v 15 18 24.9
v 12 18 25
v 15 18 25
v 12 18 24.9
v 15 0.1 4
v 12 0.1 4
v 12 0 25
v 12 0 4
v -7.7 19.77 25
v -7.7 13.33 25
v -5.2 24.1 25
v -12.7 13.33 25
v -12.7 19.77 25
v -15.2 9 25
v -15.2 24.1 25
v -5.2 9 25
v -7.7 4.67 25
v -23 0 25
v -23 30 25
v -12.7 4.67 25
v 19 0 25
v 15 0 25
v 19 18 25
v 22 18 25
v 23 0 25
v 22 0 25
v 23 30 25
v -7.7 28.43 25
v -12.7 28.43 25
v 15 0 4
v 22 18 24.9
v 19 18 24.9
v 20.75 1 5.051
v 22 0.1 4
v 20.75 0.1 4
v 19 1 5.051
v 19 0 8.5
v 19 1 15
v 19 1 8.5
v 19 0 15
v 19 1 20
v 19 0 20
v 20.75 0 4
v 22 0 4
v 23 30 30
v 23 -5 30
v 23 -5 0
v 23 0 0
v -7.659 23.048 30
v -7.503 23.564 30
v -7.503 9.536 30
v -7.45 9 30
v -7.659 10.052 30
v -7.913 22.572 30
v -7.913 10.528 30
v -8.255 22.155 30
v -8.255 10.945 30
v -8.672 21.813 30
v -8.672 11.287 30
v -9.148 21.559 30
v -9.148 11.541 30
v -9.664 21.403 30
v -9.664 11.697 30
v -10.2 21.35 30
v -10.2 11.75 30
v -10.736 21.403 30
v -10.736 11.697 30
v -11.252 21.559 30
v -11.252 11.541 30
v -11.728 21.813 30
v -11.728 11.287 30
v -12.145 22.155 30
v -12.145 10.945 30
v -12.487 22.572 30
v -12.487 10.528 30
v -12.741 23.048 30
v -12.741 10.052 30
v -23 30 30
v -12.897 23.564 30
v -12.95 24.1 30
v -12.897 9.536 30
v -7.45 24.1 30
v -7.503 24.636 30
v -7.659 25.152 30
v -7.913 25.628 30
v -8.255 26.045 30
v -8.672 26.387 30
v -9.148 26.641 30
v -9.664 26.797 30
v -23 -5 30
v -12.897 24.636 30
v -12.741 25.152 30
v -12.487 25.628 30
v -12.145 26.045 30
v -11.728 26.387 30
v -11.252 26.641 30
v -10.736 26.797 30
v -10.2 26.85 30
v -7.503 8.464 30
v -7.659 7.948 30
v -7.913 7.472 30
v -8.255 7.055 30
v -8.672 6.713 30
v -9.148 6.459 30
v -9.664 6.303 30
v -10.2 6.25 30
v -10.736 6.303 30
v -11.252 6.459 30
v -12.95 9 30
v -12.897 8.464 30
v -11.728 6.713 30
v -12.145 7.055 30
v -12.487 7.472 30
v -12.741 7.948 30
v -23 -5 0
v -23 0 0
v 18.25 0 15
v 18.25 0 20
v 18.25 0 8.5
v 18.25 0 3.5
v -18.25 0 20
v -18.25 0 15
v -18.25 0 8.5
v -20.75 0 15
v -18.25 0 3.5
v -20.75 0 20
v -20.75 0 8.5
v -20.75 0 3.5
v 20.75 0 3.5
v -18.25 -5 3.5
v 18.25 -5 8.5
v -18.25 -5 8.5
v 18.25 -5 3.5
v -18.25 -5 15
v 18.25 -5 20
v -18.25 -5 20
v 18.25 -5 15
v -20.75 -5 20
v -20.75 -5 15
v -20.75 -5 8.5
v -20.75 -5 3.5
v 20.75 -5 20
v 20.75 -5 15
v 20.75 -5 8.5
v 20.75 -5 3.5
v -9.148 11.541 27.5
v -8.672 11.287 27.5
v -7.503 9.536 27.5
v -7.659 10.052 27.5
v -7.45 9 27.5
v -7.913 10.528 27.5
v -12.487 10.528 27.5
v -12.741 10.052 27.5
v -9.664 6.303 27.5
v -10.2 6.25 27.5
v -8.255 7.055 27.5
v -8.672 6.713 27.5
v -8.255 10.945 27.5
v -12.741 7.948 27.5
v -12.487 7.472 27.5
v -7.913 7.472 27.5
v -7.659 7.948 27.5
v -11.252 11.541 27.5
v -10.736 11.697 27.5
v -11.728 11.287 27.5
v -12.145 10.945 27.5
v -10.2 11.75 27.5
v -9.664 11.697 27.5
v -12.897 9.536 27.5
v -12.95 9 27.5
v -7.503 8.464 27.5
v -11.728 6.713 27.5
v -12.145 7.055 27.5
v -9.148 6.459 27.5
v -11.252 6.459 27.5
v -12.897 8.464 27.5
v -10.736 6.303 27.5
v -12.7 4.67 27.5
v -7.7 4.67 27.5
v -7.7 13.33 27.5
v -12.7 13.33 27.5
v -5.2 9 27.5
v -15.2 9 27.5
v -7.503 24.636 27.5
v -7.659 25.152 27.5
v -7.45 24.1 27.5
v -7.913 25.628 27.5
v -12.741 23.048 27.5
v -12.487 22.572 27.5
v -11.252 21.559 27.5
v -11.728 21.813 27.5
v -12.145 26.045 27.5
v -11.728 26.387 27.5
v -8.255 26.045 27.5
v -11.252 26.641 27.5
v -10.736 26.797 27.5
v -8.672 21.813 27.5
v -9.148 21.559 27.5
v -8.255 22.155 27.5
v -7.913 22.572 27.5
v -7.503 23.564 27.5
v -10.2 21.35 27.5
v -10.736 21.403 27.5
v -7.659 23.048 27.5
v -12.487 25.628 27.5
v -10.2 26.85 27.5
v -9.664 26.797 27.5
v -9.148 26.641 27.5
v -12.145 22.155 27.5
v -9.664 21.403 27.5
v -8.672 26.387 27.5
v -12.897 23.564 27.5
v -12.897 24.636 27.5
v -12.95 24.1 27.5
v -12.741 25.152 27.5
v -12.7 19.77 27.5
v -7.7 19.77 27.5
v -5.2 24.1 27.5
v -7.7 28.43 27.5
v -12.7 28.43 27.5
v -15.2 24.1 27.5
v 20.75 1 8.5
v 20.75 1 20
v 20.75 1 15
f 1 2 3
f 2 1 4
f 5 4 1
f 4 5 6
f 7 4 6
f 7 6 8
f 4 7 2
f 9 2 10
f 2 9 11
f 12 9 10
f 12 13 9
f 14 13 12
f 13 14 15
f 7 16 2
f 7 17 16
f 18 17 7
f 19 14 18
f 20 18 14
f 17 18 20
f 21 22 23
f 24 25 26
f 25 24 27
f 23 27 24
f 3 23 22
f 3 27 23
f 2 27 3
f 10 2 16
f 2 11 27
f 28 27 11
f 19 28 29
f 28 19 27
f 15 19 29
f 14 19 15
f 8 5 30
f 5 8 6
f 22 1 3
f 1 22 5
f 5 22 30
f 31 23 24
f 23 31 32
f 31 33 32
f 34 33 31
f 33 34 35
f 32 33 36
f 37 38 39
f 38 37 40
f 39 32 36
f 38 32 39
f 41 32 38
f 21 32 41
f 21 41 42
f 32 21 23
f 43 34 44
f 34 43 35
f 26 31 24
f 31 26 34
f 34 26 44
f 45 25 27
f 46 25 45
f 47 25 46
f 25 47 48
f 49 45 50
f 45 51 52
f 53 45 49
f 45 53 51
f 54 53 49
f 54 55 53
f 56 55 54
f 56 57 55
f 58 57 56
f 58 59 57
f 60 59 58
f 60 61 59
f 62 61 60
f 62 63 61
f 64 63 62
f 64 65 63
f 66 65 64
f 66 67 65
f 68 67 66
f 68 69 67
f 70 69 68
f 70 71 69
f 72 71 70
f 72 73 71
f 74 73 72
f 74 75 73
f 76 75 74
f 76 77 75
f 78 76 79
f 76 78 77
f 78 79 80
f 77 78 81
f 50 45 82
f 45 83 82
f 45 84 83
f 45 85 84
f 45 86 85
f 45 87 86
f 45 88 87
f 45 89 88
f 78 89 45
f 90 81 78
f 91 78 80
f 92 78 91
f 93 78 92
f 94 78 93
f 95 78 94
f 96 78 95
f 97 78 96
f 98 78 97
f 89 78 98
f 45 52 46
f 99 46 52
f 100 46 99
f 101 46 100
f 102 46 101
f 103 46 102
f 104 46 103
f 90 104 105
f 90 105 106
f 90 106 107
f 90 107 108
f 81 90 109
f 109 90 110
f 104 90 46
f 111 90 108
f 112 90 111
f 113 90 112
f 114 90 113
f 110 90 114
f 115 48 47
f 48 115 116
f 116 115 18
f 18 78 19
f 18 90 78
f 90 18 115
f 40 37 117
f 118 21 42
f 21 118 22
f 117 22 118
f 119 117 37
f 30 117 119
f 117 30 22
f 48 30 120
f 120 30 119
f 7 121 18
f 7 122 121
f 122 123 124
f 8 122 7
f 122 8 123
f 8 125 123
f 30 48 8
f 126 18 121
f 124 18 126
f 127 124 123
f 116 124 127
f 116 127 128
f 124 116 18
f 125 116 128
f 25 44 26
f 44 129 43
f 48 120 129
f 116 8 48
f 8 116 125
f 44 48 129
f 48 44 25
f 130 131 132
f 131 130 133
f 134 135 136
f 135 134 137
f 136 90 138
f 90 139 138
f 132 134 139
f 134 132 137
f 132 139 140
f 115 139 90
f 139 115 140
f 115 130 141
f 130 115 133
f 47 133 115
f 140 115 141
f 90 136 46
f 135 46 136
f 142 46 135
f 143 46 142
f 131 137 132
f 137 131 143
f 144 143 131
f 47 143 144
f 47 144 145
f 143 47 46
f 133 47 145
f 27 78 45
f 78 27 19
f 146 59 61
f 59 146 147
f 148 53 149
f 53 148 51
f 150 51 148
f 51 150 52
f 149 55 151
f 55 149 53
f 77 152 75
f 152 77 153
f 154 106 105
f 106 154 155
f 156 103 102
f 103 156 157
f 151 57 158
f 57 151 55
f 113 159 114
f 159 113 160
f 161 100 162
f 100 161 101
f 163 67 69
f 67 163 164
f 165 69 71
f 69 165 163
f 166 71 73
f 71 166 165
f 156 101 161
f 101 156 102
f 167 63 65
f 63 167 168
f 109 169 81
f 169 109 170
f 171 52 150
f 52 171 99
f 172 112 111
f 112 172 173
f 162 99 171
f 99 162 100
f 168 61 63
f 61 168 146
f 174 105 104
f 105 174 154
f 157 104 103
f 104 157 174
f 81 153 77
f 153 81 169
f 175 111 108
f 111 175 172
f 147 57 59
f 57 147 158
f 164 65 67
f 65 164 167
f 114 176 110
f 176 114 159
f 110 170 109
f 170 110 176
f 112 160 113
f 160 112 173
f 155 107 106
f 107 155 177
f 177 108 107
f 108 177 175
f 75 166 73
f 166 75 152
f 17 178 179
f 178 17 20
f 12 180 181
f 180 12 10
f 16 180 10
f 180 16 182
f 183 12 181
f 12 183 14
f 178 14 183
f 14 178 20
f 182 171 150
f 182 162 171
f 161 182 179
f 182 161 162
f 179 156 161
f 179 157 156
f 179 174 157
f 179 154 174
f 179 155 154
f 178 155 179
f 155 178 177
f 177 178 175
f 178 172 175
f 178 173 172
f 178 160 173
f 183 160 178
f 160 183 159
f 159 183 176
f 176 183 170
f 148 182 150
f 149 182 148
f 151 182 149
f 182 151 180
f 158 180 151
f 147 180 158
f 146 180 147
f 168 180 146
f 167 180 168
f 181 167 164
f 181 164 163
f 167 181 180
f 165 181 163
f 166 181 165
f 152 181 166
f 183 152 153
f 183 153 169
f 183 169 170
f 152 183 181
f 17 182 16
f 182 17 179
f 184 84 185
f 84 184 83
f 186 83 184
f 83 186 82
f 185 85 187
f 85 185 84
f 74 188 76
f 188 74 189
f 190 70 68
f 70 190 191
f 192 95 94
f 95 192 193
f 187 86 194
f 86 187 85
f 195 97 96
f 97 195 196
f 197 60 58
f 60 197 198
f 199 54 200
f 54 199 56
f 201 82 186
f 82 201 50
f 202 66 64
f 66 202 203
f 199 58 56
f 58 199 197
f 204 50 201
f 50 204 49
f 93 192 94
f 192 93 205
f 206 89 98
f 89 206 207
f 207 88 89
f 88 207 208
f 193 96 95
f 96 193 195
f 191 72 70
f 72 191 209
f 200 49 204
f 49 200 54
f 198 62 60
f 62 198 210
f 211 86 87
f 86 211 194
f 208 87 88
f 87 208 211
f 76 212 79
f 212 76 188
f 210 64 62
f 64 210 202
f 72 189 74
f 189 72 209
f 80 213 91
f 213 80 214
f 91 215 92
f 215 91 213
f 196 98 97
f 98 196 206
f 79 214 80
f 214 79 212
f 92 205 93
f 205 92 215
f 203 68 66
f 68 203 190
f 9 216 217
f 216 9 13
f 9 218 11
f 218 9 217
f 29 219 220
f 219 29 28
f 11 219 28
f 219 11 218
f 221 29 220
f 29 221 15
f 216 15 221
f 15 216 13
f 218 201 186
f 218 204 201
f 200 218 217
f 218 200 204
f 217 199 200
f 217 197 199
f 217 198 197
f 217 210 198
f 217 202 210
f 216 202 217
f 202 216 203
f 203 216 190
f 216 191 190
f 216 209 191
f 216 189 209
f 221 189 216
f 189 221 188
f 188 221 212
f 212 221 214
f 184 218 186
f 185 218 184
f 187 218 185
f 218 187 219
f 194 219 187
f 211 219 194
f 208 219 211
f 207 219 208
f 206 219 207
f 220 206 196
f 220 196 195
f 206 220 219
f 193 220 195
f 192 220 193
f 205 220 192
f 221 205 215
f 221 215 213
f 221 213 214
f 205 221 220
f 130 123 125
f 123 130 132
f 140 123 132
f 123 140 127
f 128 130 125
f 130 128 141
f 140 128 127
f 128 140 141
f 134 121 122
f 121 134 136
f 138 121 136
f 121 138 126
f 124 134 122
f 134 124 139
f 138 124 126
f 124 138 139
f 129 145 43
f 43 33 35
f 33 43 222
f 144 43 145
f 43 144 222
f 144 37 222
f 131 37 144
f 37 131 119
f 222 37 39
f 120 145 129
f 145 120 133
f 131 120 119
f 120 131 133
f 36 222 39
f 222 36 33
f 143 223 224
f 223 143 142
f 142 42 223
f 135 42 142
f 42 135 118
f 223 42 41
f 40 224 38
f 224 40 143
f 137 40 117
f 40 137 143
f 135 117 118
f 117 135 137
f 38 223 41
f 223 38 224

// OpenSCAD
// file: s0_lib.scad
// s0_lib.scad - shared constants and helpers for every S0 printed part
// PROJECT SCRATCH, 14-build/S0/cad, S0 kit engineer, 2026-10-02.  Units mm.
// gen_s0_stl.py mirrors these names one-for-one; change both together.
// Dish frame: C = ball (scalp) centre at the origin, +Z up the pad axis.  SYSTEM-SPEC-v3 sec 3.1, 4.1, 4.2.
// Two generated includes come from dish_kinematics.py: pocket_cavity.scad, template_paths.scad.

$fn = 64;

// ---------- fasteners ----------
M3_CLEAR = 3.4;  M3_PILOT = 2.6;  M3_CB_D = 6.2;  M3_CB_H = 3.2;
WOOD_SCREW = 4.5;

// ---------- dish bench (spec 4.1, 4.2; bench deviations in ../CONFLICTS.md) ----------
R_SCALP = 85;            // ball / crown radius
RB = 3;                  // 6 mm Delrin ball radius
R_DC = 157;              // ball-centre sphere (ceiling R 160)
A_DOME = 26;             // bench: balls at R 26 (spec M11 says R 22: CONFLICTS #3)
DOME_ANG = [90, 210, 330];
NAIL_R = 18;             // pentagon radius, spec 4.1
NAIL_ANG = [0, 144, 216];// P0, P2, P3 = group A
Z_DOME = sqrt(R_DC*R_DC - A_DOME*A_DOME);   // 154.83, ball centre height at home
POCKET_R = 21;
DECK_R = 58;
DECK_ZTOP = 175;
LEG_R = 55;  LEG_D_TOP = 10;  LEG_D_BOT = 7;  FOOT_D = 8;
FOOT_C_R = R_SCALP + FOOT_D/2;              // feet centres on R 89 about C
GRIP = [0, 45, 14, 30];                     // x, y, dia, height on the deck top
TPL_PIN = [[22, 22], [-22, -52]];
NOSE_Z0 = 115.5;  NOSE_Z1 = 123.5;          // nose plate: 32.4 mm above the R 85 contact plane
BODY_Z1 = 138;  TOP_Z1 = 142;
BODY_D = 50;  TOP_D = 62;
BORE_D = 6.4;  STEM_BORE_D = 4.7;  STEM_D = 4.5;
SCREW_R = 20;  SCREW_ANG = [60, 180, 300];
POST_D0 = 8;  POST_D1 = 7;  POST_TOP = Z_DOME - 0.6;
BALL_SOCKET_D = 6.1;
WELL_D_TOP = 24;  WELL_D_BOT = 9;  WELL_Z_BOT = 125.5;  HOOK_Z = 128;
EAR = [-7, 7, -40, -24];                    // x0, x1, y0, y1 of the C-arm ear (full body height)
NOSE_D = 50;
PLUNGER_D = 6;  PLUNGER_H = 7;  PLUNGER_FLOOR = 2.5;  CUP_D = 5.3;
MAG_D = 3.1;  MAG_H = 2;
SEAT_D = 6;  SEAT_H = 1.5;
NAIL_TIP_D = 2;  NAIL_TIP_R = 0.4;  NAIL_CONE_H = 1.25;
PIN_HOLE_D = 1.1;  PIN_HOLE_DEPTH = 5;
function nail_len(reserve) = NOSE_Z1 - (sqrt(R_SCALP*R_SCALP - NAIL_R*NAIL_R) - reserve);   // 42.43 / 43.43
// C-arm
CARM_W = 10;  CARM_LOW_Z = 132;  CARM_LOW_H = 6;  CARM_RISER_Y = -88;
CARM_TOP_Z0 = 197;  CARM_TOP_H = 8;
STYLUS_Y = [0, -30];
DRIVE_GRIP = [14, 141, 28];                 // dia, z, length: push here (low), never on the top bar
// templates
TPL_H = 19;  TPL_BASE = 2;  GROOVE_D = 3.4;  WALL_D = 7;
TPL_OUTLINE = [-26, 26, -57, 27, 6];        // x0, x1, y0, y1, corner radius
// skid ring (hand-rake mode)
SKID_T = 3;  SKID_Z0 = NOSE_Z0 - SKID_T;  SKID_FOOT_R = 28;

// ---------- tendon ink rig (S0b) ----------
DRUM_PITCH_D = 12;  DRUM_LAND_D = 12.4;  GROOVE_R = 0.32;  GROOVE_PITCH = 1;
DRUM_FL_D = 24;  HUB_D = 16;  HUB_H = 8;  FL_H = 2;
GROOVE_W = 5.5;  SEP_W = 1;
SHAFT_D = 5.15;  SHAFT_FLAT = 2.1;          // 5 mm D-shaft, flat 0.5 deep  [VERIFY on the motor]
ANCHOR_R = 9.5;
STOP_CABLE_Z = 30 + HUB_H + FL_H + GROOVE_W/2;   // groove A centre above the plywood (motor table top 30)
RIG_STOP_R = 60;  POST_R = 22;
PEN_PLATE_Z0 = 12;  PEN_PLATE_Z1 = 16;  RIG_CABLE_Z = PEN_PLATE_Z1 + 3;

// ---------- helpers ----------
function polar(r, a) = [r*cos(a), r*sin(a)];
module box(x0, x1, y0, y1, z0, z1) translate([x0, y0, z0]) cube([x1-x0, y1-y0, z1-z0]);
module cyl(d, z0, z1, x=0, y=0, d2=-1, fn=$fn)
    translate([x, y, z0]) cylinder(d1=d, d2=(d2 < 0 ? d : d2), h=z1-z0, $fn=fn);
module sph(d, c, fn=$fn) translate(c) sphere(d=d, $fn=fn);
module cyl_ab(d, a, b, fn=32) {             // cylinder of diameter d from point a to point b
    v = b - a;  L = norm(v);
    translate(a) rotate([0, acos(v[2]/L), atan2(v[1], v[0])]) cylinder(d=d, h=L, $fn=fn);
}
module swept(path, d, z0, z1, fn=24)        // hull-chain of vertical cylinders along an XY polyline
    for (i = [0:len(path)-2]) hull() { cyl(d, z0, z1, path[i][0], path[i][1], fn=fn); cyl(d, z0, z1, path[i+1][0], path[i+1][1], fn=fn); }
// main file
// helmet_test.scad - S0a helmet / hinge / coin-bag fit test (leap4-E E4 (e)), printed part H01 (x2)
// PROJECT SCRATCH, 14-build/S0/cad, 2026-10-02.  gen_s0_stl.py mirrors it.
// L-bracket hinge pad.  The base (X-Z plane) goes on the side of the bike helmet (foam tape + two
// zip ties through vents); the flange sticks straight out sideways (+Y).  The Southco E6-10-101-20
// fixed leaf lies on top of the flange with its two studs down through the holes (nuts underneath),
// so the hinge PIN points ear-to-ear (along Y), which is the spec's alpha axis (C23): the bail then
// swings forward and back over the head.  E6 leaf: studs 15.1 mm apart along the pin, 10.2 mm from
// the pin (Southco e6-at.en.pdf, panel holes 5.4 +0.1/-0).  No printer: a 1 x 1 in aluminium angle
// bracket drilled 7/32 in at the same spacing does the same job.
include <s0_lib.scad>
HB = [46, 5, 30];           // base: X (front-back) x Y (thickness) x Z (height)
HF = [46, 30, 5];           // flange: X x Y (outward) x Z (thickness), on top of the base
E6_PITCH = 15.1;  E6_HOLE = 5.5;  E6_PIN_OFF = 10.2;
module hinge_pad() difference() {
    union() {
        box(-HB[0]/2, HB[0]/2, -HB[1], 0, 0, HB[2]);                         // base against the helmet
        box(-HF[0]/2, HF[0]/2, -HB[1], HF[1], HB[2] - HF[2], HB[2]);          // flange
        for (x = [12, 19]) hull() { box(x, x + 3, -0.1, 0.1, 4, HB[2] - HF[2]); box(x, x + 3, -0.1, 18, HB[2] - HF[2] - 0.1, HB[2] - HF[2]); }   // gussets
    }
    for (y = [9, 9 + E6_PITCH]) {
        cyl(E6_HOLE, HB[2] - HF[2] - 1, HB[2] + 1, -E6_PIN_OFF, y, fn=32);
        cyl(10, HB[2] - HF[2] - 1, HB[2] - HF[2] + 2.5, -E6_PIN_OFF, y, fn=6);   // nut pocket under the flange
    }
    for (x = [-HB[0]/2 + 3.5, HB[0]/2 - 3.5], z = [6, 17.5]) box(x - 1.25, x + 1.25, -HB[1] - 1, 1, z - 2.5, z + 2.5);   // zip-tie slots
}
hinge_pad();     // print with the flange top face on the bed (rotate [180, 0, 0])
